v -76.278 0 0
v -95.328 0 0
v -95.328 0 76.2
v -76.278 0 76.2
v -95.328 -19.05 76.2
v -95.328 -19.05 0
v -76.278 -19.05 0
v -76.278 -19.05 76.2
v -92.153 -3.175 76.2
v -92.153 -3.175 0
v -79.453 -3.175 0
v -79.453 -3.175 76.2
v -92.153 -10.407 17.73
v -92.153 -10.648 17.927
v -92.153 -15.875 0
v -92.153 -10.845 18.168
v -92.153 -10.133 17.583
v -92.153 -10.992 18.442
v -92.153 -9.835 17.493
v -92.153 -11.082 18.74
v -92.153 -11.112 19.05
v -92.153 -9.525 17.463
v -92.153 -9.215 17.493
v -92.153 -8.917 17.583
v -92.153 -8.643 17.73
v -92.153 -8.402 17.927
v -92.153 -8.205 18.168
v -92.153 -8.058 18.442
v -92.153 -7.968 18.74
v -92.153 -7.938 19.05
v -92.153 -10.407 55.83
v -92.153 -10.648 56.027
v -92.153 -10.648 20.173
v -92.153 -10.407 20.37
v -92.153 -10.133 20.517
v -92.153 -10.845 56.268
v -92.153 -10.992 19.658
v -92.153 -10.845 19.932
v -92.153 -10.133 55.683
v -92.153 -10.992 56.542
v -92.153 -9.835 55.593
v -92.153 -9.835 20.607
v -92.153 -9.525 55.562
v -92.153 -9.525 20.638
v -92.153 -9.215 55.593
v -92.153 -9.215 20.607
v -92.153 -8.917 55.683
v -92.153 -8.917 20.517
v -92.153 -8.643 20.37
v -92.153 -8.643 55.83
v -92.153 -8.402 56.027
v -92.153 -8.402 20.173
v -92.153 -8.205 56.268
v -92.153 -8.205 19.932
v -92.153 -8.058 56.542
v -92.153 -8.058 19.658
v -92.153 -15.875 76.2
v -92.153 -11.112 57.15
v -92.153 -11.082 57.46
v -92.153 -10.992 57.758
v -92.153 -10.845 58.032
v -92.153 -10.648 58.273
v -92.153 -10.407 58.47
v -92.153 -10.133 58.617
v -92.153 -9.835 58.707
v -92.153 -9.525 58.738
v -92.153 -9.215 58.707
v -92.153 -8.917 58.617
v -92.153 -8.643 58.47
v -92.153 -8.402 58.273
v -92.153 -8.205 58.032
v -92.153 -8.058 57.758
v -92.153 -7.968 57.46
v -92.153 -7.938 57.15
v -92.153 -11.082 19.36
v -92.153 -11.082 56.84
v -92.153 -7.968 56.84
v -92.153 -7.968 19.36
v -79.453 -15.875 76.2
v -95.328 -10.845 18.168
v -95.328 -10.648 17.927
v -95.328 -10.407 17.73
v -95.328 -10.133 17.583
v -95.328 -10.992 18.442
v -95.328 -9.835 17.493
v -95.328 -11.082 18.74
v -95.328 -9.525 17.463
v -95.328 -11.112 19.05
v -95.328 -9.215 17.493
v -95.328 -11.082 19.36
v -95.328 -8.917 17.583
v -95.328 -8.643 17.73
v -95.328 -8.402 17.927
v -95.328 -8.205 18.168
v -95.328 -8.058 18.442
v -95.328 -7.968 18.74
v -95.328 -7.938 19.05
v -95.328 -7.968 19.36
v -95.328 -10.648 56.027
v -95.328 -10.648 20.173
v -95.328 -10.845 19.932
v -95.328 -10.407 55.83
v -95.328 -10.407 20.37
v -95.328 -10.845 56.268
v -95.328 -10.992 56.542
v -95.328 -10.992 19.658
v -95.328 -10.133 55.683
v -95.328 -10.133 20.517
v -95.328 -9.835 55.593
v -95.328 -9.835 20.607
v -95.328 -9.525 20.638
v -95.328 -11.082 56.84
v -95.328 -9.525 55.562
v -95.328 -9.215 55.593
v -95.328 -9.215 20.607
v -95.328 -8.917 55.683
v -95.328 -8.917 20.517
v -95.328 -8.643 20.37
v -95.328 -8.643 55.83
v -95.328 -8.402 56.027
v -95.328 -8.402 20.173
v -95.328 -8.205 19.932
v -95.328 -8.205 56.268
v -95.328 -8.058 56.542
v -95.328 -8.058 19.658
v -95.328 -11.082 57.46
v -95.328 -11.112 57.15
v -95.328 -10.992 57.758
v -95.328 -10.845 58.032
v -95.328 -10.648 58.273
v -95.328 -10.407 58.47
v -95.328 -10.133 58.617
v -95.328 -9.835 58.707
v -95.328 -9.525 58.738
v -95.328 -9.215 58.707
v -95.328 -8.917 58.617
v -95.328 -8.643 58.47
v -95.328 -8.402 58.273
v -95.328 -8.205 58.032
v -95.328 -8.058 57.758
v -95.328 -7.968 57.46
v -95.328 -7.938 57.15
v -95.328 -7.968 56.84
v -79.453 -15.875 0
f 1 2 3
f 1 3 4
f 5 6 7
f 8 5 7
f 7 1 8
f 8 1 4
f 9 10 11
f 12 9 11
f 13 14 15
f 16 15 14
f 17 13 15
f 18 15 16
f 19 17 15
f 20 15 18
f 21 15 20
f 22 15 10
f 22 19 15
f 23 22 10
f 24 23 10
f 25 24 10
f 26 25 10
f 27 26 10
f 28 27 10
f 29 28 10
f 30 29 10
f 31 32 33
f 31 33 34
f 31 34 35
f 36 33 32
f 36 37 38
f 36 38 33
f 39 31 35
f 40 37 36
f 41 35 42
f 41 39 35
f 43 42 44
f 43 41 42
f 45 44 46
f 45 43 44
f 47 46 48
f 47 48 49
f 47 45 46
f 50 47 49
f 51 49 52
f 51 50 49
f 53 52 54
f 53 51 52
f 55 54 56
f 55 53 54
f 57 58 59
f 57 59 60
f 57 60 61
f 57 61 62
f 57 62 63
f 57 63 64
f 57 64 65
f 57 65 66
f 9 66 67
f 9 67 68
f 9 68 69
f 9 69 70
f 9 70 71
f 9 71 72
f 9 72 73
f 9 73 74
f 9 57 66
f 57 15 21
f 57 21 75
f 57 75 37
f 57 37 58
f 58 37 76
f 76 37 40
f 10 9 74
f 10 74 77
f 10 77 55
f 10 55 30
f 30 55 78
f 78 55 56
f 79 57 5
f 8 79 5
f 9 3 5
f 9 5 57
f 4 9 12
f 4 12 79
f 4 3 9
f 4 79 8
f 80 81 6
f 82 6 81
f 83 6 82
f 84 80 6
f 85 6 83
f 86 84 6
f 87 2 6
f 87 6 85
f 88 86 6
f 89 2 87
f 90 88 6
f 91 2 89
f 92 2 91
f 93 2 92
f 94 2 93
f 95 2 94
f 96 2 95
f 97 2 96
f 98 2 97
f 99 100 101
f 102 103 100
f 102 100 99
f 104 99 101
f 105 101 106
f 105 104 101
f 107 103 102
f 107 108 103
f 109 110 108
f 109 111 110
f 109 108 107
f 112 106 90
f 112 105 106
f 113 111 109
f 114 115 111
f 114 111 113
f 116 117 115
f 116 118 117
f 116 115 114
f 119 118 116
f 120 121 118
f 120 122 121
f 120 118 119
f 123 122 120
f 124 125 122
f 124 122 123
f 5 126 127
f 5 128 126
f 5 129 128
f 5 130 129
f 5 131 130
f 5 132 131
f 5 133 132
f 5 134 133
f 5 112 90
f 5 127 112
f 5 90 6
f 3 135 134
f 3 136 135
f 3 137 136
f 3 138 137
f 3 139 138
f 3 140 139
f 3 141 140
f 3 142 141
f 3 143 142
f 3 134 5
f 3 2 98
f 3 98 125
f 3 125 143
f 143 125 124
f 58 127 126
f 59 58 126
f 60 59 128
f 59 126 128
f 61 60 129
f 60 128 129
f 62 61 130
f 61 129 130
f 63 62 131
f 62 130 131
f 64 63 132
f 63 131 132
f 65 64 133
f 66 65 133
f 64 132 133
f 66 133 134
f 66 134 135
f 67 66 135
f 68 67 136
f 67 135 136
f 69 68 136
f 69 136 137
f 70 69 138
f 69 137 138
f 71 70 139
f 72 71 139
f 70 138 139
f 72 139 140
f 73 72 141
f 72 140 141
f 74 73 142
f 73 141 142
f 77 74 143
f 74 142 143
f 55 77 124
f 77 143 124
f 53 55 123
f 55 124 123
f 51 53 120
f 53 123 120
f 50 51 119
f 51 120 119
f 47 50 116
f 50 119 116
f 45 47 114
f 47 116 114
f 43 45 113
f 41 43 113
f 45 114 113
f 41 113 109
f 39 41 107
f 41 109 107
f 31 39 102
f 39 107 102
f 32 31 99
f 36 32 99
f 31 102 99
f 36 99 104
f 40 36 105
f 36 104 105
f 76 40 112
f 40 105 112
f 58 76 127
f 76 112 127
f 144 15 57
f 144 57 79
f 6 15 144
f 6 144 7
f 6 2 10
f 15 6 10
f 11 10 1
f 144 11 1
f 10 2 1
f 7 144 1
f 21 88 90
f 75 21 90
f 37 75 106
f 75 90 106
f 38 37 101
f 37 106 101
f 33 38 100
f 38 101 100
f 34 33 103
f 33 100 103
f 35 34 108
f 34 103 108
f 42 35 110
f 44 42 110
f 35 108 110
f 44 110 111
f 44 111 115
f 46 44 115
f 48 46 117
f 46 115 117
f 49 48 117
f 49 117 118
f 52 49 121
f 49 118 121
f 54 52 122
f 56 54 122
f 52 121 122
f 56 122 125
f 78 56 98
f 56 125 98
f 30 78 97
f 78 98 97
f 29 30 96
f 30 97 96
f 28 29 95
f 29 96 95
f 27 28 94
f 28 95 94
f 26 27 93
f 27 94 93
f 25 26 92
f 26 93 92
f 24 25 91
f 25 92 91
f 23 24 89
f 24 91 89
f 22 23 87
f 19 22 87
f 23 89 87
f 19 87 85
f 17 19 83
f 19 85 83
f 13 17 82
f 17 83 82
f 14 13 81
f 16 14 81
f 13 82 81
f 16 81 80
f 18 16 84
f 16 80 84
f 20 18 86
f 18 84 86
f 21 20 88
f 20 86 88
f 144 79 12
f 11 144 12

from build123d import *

# Parameters (mm, degrees)
F0_W     = 19.05
F0_H     = 76.2
F1_DEPTH = 19.05
F2_W     = 12.7
F2_H     = 12.7
F3_DEPTH = 76.201
F4_R     = 1.5875
F5_DEPTH = 3.175


with BuildPart() as f1:
    # F0 (on Front) → F1 (new body)
    with BuildSketch(Plane.XZ):
        with Locations((-85.803381, 38.1)):
            Rectangle(F0_W, F0_H)
    extrude(amount=F1_DEPTH)

    # F2 (on face) → F3 (cut, through all)
    with BuildSketch(Plane.XY.offset(76.2)):
        with Locations((-85.803381, -9.525)):
            Rectangle(F2_W, F2_H)
    extrude(amount=-F3_DEPTH, mode=Mode.SUBTRACT)

    # F4 (on face) → F5 (cut)
    with BuildSketch(Plane(origin=(-95.328381, 0, 0), x_dir=(0, -1, 0), z_dir=(-1, 0, 0))):
        with Locations((9.525, 57.15)):
            Circle(F4_R)
        with Locations((9.525, 19.05)):
            Circle(F4_R)
    extrude(amount=-F5_DEPTH, mode=Mode.SUBTRACT)


solid = f1.part
